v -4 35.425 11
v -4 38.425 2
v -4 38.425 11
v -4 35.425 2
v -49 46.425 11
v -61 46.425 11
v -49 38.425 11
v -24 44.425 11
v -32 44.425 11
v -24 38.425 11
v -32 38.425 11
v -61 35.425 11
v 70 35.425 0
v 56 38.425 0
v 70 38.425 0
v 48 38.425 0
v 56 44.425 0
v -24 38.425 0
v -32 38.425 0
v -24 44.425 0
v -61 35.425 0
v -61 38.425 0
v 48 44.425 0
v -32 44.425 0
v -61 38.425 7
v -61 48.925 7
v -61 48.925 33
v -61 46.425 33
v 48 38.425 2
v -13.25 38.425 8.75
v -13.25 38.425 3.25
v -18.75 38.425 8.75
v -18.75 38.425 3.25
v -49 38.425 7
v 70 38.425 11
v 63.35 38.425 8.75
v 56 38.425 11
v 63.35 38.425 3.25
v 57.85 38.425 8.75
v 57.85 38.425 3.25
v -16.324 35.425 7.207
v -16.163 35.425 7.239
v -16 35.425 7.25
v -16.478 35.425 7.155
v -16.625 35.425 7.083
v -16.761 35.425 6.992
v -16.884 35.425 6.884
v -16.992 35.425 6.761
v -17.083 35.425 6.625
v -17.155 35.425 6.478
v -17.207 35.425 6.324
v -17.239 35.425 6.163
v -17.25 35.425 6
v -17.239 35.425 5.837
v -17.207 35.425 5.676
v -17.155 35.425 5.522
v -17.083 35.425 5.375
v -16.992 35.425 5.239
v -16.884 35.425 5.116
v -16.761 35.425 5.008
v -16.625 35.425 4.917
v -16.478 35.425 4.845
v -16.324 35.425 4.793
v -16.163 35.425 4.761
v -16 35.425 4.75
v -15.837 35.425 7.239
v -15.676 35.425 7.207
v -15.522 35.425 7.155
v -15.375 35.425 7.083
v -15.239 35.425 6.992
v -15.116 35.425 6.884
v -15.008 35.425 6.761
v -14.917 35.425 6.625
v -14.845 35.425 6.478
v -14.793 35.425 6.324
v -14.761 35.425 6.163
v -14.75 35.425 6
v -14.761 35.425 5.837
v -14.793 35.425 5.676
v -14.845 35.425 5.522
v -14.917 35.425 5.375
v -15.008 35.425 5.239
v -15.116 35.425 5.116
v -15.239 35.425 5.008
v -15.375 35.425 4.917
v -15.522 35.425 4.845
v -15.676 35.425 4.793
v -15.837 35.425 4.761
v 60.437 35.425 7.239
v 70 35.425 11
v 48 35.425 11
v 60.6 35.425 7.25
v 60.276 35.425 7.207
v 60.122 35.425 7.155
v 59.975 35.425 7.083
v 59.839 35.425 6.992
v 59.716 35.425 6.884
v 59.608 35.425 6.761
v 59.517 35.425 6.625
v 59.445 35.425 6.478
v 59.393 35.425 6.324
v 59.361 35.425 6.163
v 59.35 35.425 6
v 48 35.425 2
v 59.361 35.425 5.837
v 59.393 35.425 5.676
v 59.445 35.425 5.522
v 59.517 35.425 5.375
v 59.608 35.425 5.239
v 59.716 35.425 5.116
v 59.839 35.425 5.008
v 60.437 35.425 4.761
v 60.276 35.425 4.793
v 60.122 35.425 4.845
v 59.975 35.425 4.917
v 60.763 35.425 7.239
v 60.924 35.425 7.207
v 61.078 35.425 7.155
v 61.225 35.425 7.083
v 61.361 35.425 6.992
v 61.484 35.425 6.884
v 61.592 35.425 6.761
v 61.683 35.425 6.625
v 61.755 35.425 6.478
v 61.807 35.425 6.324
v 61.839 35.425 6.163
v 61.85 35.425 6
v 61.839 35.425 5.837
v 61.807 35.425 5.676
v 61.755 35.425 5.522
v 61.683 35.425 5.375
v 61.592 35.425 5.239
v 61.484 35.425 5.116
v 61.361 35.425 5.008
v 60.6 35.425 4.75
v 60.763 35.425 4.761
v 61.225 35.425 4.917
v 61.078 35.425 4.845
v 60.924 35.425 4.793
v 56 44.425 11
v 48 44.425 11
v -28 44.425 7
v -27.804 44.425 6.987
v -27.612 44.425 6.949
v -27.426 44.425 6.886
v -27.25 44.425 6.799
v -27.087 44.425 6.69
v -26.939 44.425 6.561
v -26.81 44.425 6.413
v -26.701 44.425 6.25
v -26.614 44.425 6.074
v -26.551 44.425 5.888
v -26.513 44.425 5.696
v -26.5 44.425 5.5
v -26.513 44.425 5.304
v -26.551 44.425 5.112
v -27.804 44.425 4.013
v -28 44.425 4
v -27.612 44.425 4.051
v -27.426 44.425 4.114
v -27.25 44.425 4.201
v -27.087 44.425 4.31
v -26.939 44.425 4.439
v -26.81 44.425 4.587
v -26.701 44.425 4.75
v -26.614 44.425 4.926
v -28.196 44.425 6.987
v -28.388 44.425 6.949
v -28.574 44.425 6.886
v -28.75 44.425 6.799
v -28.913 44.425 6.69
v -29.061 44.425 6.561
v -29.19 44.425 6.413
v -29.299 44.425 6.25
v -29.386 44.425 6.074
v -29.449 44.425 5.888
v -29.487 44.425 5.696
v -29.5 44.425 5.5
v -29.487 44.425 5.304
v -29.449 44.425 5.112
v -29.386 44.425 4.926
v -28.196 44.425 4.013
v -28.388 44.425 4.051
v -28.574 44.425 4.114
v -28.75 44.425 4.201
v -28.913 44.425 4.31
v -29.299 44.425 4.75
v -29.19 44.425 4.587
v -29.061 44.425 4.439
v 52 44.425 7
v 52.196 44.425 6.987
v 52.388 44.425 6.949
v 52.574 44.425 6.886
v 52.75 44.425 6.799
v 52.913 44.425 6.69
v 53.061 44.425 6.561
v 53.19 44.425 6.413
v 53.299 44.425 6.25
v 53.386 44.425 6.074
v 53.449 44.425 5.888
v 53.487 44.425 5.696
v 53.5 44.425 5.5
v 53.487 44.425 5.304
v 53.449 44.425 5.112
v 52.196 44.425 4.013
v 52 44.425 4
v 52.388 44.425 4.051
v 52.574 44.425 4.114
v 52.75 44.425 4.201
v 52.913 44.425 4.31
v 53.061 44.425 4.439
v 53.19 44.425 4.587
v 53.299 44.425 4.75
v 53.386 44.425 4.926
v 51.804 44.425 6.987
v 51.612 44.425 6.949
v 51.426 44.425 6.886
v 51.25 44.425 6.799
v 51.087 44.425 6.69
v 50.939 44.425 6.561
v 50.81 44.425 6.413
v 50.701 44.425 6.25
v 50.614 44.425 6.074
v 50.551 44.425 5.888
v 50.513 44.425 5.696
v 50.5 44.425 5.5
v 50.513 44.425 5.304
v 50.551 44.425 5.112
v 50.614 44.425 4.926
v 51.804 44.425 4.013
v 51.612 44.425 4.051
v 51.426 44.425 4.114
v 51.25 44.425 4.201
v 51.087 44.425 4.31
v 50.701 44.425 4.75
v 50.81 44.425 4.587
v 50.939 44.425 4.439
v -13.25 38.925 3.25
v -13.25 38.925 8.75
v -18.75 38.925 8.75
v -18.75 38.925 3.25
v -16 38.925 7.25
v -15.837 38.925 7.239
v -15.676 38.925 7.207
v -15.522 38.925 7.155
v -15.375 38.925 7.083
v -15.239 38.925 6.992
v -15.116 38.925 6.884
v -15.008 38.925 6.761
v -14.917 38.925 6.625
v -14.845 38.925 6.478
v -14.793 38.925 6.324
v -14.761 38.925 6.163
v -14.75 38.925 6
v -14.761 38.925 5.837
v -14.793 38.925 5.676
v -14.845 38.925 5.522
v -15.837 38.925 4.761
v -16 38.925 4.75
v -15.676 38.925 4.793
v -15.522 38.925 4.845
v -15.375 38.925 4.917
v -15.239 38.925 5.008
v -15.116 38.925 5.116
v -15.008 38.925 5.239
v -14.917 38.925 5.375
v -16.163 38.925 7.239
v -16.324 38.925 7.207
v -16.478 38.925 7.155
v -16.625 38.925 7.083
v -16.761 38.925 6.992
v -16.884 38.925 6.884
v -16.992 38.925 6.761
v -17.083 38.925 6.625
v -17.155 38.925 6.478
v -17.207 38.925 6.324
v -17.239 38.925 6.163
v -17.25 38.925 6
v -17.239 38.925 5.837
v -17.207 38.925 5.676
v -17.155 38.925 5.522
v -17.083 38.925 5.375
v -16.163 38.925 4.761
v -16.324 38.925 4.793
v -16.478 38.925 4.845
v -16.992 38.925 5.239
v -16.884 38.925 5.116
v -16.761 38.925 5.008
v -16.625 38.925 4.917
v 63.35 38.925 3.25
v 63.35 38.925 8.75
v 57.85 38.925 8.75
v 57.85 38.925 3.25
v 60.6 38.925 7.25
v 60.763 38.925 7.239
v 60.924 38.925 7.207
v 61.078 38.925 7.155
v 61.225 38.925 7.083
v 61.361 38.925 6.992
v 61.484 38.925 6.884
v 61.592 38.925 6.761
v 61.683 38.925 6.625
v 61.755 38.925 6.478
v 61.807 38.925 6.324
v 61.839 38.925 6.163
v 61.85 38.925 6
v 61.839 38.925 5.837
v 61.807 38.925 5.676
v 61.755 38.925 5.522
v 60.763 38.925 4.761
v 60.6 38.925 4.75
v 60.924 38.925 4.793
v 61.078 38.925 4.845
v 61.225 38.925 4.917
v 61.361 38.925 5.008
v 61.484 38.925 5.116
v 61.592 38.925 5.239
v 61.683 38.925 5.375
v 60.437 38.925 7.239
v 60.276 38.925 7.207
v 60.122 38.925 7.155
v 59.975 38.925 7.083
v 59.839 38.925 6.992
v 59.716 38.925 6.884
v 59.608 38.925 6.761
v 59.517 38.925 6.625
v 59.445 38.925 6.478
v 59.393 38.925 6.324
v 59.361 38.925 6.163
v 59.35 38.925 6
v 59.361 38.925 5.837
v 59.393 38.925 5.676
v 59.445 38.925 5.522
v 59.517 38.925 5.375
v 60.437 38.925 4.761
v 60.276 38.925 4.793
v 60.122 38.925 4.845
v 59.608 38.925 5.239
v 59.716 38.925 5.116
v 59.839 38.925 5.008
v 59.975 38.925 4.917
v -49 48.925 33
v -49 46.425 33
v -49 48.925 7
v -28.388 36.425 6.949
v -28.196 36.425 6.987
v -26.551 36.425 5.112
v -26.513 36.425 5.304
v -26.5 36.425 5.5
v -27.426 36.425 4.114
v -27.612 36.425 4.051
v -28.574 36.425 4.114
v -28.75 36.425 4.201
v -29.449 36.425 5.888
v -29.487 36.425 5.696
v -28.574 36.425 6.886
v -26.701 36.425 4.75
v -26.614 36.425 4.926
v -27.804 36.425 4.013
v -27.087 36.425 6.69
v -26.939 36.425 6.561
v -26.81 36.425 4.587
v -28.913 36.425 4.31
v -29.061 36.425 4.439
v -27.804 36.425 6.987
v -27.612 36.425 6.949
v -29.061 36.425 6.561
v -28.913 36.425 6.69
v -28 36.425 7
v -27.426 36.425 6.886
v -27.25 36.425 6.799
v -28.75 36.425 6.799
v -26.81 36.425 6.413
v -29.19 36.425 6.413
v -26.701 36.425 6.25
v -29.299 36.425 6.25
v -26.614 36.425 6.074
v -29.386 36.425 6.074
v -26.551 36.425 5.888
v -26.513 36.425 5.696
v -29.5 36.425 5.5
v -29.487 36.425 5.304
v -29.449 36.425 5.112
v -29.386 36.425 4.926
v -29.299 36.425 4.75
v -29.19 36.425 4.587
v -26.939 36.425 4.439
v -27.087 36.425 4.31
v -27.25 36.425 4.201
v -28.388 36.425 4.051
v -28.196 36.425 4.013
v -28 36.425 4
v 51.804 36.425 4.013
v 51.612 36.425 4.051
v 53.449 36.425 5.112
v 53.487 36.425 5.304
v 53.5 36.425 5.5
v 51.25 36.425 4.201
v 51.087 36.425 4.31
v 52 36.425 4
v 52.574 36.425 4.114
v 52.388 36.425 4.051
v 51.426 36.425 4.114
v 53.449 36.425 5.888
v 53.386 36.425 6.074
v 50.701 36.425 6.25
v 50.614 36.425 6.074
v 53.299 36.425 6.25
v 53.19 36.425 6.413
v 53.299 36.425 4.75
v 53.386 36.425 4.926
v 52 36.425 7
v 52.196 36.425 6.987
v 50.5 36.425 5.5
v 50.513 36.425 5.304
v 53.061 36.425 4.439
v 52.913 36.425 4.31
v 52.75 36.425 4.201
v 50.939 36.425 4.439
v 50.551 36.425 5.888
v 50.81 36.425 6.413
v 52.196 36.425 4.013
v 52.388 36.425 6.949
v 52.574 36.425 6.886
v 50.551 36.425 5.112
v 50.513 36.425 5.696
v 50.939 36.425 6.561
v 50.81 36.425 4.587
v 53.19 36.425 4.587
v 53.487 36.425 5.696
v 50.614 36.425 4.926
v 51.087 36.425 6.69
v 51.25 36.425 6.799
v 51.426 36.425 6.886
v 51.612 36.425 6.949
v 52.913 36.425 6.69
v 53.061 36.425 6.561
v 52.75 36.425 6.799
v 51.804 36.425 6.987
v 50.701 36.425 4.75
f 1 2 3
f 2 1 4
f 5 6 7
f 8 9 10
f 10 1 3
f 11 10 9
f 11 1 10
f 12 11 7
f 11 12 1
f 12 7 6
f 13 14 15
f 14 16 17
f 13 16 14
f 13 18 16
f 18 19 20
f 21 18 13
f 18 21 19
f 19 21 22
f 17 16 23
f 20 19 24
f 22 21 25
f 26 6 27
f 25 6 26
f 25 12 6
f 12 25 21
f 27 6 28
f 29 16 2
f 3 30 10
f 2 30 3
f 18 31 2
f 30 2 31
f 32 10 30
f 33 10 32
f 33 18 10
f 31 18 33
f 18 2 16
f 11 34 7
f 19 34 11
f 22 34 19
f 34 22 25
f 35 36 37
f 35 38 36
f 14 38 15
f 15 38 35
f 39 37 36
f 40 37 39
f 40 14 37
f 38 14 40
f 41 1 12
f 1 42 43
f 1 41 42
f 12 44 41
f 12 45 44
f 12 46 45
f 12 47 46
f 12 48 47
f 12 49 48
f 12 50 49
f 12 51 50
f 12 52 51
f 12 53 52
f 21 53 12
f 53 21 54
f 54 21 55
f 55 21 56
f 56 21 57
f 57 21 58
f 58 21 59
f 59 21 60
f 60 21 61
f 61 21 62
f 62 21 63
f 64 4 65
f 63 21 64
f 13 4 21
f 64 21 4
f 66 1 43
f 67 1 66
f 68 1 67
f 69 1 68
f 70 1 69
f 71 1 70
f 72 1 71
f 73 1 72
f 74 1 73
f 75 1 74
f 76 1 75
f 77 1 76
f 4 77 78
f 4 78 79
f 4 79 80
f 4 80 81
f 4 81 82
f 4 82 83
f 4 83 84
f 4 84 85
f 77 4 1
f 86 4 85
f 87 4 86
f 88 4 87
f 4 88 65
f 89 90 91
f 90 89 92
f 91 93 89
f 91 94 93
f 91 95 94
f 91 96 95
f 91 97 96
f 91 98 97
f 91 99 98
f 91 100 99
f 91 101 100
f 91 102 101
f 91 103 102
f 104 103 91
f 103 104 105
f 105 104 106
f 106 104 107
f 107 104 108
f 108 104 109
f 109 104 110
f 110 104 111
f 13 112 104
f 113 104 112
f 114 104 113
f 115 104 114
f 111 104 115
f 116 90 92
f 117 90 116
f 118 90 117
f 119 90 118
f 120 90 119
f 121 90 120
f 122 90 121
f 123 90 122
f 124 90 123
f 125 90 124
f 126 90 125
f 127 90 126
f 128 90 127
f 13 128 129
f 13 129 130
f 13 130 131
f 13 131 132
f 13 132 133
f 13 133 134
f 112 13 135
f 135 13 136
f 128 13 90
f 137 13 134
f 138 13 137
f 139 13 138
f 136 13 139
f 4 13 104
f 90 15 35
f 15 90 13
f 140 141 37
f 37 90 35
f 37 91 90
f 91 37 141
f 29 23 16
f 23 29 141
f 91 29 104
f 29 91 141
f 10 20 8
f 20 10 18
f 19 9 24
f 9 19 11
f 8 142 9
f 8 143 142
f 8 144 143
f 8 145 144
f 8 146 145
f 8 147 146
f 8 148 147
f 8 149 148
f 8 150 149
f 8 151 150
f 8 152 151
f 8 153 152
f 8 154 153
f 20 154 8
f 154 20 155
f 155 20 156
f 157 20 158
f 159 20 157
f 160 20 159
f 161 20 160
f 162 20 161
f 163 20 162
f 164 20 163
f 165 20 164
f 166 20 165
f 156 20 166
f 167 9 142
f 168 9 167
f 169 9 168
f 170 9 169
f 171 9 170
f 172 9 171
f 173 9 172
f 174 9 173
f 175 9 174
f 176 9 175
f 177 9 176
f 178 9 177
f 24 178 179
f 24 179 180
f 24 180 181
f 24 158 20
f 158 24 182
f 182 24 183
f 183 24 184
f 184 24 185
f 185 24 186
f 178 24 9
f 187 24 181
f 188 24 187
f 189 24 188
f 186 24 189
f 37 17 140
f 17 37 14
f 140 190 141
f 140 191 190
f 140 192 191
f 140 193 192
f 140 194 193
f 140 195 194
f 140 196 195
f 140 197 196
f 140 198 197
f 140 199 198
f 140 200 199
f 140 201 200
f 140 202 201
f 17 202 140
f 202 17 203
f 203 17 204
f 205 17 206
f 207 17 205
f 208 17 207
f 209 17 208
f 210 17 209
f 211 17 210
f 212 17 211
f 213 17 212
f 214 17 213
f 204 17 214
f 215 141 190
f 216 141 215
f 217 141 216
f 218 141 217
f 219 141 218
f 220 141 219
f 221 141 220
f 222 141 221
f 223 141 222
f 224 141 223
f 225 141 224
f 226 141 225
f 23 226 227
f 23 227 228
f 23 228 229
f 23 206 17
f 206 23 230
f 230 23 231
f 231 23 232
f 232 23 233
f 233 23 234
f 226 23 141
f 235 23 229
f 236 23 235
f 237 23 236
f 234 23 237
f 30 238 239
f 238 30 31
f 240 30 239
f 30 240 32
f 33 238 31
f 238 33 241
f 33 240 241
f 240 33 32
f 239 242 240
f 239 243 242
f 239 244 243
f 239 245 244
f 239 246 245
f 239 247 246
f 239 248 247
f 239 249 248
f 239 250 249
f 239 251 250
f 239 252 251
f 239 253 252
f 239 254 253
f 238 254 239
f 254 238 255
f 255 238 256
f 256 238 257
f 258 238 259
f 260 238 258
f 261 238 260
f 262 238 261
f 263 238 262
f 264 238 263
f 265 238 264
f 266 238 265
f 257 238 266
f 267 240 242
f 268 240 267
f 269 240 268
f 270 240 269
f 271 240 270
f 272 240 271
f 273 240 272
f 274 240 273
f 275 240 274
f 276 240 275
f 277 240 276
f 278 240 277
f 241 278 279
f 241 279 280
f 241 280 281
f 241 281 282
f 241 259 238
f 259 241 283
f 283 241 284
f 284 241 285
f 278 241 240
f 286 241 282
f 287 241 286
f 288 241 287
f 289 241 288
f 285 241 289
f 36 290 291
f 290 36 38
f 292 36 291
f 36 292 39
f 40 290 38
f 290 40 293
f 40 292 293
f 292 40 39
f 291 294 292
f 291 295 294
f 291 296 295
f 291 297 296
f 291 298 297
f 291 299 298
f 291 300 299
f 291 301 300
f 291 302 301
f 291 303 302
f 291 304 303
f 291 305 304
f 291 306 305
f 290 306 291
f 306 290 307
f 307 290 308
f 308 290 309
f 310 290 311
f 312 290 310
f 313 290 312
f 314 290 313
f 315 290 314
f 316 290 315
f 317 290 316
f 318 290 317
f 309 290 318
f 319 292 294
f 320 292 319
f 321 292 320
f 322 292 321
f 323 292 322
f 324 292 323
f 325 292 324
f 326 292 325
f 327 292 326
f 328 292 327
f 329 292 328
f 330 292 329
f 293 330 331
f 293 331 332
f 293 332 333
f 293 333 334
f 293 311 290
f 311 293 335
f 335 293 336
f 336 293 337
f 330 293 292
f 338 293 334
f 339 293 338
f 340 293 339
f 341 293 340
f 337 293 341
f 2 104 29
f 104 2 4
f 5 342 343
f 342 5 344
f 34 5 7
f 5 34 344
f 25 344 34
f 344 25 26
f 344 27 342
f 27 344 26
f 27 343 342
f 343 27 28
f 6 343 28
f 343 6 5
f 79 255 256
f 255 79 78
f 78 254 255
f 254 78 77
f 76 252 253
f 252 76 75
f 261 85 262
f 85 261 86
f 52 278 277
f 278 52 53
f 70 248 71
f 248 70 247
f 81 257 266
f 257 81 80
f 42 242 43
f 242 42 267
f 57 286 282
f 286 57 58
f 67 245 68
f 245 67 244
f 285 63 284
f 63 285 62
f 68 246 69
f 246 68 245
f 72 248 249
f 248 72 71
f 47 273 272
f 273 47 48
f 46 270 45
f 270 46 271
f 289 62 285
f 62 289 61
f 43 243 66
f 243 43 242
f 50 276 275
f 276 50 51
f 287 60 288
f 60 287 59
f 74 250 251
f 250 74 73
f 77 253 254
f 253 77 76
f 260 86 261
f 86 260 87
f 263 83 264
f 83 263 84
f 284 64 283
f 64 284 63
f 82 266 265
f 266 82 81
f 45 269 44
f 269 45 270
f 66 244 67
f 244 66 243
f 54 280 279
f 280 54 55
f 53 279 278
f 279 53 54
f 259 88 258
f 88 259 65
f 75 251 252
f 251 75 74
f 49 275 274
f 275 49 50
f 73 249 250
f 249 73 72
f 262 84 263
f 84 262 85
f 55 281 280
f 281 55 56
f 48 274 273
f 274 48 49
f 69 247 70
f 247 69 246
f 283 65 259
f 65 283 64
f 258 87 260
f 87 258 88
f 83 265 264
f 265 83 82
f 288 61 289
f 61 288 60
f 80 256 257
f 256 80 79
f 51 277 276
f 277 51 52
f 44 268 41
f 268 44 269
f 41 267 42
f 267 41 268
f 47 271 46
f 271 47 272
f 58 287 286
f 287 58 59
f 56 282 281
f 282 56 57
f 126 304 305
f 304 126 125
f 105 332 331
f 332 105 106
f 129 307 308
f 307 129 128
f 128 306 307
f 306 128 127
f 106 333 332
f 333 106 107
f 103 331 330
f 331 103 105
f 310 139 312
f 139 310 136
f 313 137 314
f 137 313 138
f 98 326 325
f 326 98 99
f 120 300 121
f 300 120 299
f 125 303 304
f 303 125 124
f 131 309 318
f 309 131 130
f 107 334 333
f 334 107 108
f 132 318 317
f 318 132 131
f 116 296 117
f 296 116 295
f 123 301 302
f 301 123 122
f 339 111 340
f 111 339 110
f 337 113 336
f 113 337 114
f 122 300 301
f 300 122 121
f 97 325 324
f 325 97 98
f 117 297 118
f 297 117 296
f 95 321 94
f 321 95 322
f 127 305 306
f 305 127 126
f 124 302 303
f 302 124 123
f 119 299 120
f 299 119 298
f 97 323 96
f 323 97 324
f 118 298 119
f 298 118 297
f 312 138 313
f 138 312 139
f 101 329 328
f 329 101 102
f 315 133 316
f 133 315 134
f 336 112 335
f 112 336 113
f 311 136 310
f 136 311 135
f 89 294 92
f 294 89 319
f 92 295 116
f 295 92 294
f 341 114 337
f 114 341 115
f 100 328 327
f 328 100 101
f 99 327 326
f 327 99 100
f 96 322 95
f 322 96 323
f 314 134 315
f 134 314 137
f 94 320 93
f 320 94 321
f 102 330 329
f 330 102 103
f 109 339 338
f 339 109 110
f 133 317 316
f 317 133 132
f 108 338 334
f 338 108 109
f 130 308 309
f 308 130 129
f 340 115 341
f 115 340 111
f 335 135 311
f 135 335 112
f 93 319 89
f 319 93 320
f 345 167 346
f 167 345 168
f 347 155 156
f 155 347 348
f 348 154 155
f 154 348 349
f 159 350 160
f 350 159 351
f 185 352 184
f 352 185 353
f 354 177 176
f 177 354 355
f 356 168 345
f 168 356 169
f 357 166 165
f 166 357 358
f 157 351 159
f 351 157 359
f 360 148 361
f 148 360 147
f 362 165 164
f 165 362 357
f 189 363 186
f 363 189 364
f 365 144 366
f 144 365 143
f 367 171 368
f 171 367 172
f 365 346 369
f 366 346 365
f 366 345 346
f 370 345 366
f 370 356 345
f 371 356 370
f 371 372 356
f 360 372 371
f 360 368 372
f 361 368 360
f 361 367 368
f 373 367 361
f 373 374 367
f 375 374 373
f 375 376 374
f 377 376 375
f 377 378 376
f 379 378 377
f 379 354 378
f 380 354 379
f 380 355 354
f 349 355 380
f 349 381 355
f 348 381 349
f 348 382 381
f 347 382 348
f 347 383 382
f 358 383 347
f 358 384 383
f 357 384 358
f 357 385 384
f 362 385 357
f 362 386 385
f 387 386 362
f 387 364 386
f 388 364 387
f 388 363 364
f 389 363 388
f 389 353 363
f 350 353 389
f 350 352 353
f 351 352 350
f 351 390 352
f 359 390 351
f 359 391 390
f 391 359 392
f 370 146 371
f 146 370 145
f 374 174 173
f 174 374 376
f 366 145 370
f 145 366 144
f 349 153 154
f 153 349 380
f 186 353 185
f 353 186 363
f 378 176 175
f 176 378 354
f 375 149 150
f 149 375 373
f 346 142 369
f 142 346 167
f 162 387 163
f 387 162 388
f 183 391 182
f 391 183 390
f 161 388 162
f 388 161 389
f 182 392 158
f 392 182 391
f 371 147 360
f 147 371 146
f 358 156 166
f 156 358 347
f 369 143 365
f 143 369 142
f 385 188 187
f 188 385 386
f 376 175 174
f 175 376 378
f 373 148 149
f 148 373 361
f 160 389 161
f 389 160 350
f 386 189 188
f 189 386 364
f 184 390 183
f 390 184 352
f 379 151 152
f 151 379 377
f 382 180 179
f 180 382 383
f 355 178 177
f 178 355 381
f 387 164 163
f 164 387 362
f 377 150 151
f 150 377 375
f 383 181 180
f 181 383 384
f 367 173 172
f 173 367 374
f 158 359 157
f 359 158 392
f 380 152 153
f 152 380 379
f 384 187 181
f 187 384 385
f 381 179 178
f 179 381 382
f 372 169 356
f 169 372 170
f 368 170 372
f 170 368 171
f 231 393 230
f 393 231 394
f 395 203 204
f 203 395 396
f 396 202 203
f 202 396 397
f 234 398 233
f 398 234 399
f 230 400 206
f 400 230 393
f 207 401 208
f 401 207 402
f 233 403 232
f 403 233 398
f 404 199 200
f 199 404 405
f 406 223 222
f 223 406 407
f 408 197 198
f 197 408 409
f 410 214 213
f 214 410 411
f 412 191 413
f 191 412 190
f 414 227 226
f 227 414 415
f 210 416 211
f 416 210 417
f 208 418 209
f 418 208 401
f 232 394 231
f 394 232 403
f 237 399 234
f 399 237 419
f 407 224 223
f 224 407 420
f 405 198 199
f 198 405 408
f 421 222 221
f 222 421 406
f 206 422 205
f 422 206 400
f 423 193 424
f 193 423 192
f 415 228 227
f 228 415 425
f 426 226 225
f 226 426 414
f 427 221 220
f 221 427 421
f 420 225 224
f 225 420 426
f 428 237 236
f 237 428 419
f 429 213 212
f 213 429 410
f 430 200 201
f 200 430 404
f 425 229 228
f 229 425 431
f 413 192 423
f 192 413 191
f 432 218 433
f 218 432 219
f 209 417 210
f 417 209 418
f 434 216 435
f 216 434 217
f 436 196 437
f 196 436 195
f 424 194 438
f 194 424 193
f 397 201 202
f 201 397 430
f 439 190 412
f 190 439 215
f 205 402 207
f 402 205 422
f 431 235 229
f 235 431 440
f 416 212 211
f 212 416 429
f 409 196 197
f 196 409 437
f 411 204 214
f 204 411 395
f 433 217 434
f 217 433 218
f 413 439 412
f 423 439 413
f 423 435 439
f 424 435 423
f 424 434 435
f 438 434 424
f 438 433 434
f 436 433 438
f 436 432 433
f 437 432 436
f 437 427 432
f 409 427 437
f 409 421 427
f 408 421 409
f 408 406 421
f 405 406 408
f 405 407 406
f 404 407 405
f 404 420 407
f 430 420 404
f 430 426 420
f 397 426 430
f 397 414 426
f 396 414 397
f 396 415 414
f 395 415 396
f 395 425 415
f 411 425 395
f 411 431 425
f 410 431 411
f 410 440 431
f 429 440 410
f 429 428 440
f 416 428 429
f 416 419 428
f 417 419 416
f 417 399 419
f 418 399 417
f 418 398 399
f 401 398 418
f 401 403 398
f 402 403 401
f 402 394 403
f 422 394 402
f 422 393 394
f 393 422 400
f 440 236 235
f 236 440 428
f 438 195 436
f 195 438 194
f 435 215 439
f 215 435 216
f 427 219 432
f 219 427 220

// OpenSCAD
// file: common.scad
// Small helpers shared by the part files. Include after params.scad.

// An axis-aligned box given by its extents, as task.py's _mm(x0, x1, y0, y1, z0, z1) does.
module box(x0, x1, y0, y1, z0, z1) {
    translate([x0, y0, z0]) cube([x1 - x0, y1 - y0, z1 - z0]);
}

// A round hole or rod along +y from y0 to y1, its axis at (x, z).
module ybore(x, y0, y1, z, d) {
    translate([x, y0, z]) rotate([-90, 0, 0]) cylinder(d = d, h = y1 - y0);
}
// file: params.scad
// Shared dimensions for the printed carrier, sprung rail, guide-rod mounts and SSD dummy (all in mm, grams, N/mm).
//
// Every line is either
//   NAME = value; // task.py: <expression>   a number taken from task.py; check_params.py evaluates <expression>
//                                            against the imported task module (box(BOXES, i) gives a box's
//                                            [x0, x1, y0, y1, z0, z1] in mm) and asserts it equals value
//   NAME = value; // fab: <reason>           a fabrication choice (fit, hardware size); check_params.py checks
//                                            that these are consistent with the task numbers
// Keep one assignment per line and use only numbers, + - * /, names and [ ] lists: check_params.py parses this file.
//
// Frames, as in task.py:
//   carrier: origin on the table under the carrier's centre; x along the carrier, handle bezel toward -x, the drive's
//            connector end (rear) at +x; y across, the sprung rail at +y, the fixed rail at -y; z up.
//   SSD:     origin under the drive's centre on its bottom face; x along it, connector end toward +x; z up.

// ---- the SSD (task.py "the SSD, in its own frame") -----------------------------------------------------------------
SSD_L = 100; // task.py: SSD_L * 1000
SSD_W = 69.85; // task.py: SSD_W * 1000
SSD_H = 7; // task.py: SSD_H * 1000
SSD_MASS_G = 55; // task.py: SSD_MASS * 1000
HALF_W = 34.925; // task.py: HALF_W
HOLE_X = [-36.0, 40.6]; // task.py: HOLE_X
HOLE_Z = 3; // task.py: HOLE_Z
HOLE = 4; // task.py: HOLE
HOLE_DEPTH = 3; // task.py: HOLE_DEPTH
CONN_X = [44, 50]; // task.py: box(SSD_BOXES, 1)[0:2]
CONN_Y = [-31.925, 0]; // task.py: box(SSD_BOXES, 1)[2:4]
LABEL_X = [-42, 30]; // task.py: box(SSD_BOXES, 3)[0:2]
LABEL_Y = [-26, 26]; // task.py: box(SSD_BOXES, 3)[2:4]

// ---- the carrier (task.py "the carrier, in its own frame") ---------------------------------------------------------
CAR_L = 140; // task.py: CAR_L * 1000
CAR_W = 76; // task.py: CAR_W * 1000
CAR_H = 15; // task.py: CAR_H * 1000
CAR_MASS_G = 200; // task.py: CAR_MASS * 1000
SEAT_X = 20; // task.py: SX
SEAT_Z = 4; // task.py: SZ
GAP = 0.5; // task.py: GAP
PIN = 2.5; // task.py: PIN
PIN_IN = 2; // task.py: PIN_IN
RAIL_T = 3; // task.py: RAIL_T
RAIL_IN = 35.425; // task.py: RAIL_IN
RAIL_OUT = 38.425; // task.py: RAIL_OUT
PIN_X = [-16.0, 60.6]; // task.py: PIN_X
PIN_Z = 7; // task.py: PIN_Z
RAIL_SEGS = [[-61, -4], [48, 70]]; // task.py: RAIL_SEGS
RIB_X = [[-25, -10], [50, 65]]; // task.py: RIB_X
RIB_Y_END = 33; // task.py: box(CARRIER_BOXES, 3)[3]
BEZEL_X = [-70, -62]; // task.py: box(CARRIER_BOXES, 0)[0:2]
BEZEL_Y = 38; // task.py: box(CARRIER_BOXES, 0)[3]
HANDLE_X = [-74, -70]; // task.py: box(CARRIER_BOXES, 1)[0:2]
HANDLE_Y = 25; // task.py: box(CARRIER_BOXES, 1)[3]
HANDLE_Z = [3, 12]; // task.py: box(CARRIER_BOXES, 1)[4:6]
FLOOR_X = [-62, -34]; // task.py: box(CARRIER_BOXES, 2)[0:2]
FLOOR_Y = 33; // task.py: box(CARRIER_BOXES, 2)[3]
FLOOR_H = 3; // task.py: box(CARRIER_BOXES, 2)[5]
FIXED_BAR_X = [-70, 70]; // task.py: box(CARRIER_BOXES, 5)[0:2]
FIXED_BAR_H = 3; // task.py: box(CARRIER_BOXES, 5)[5]
FIXED_SEG0_X0 = -62; // task.py: box(CARRIER_BOXES, 6)[0]
RAIL_H = 12; // task.py: box(CARRIER_BOXES, 6)[5]

// ---- the sprung rail (task.py _latch_rail) -------------------------------------------------------------------------
RAIL_Z0 = 1; // task.py: box(rail.boxes, 0)[4]
RAIL_BAR_X = [-61, 70]; // task.py: box(rail.boxes, 2)[0:2]
RAIL_BAR_H = 3; // task.py: box(rail.boxes, 2)[5]
RAIL_TRAVEL = 7; // task.py: RAIL_TRAVEL * 1000
RAIL_RATE = 0.15; // task.py: RAIL_RATE / 1000
RAIL_MASS_G = 30; // task.py: rail.mass * 1000
TAB_X = [-61, -49]; // task.py: TAB_X
TAB_Y = [46.425, 48.925]; // task.py: TAB_Y
TAB_Z = [8, 34]; // task.py: TAB_Z
BRACKET_Z = [8, 12]; // task.py: box(rail.boxes, 3)[4:6]

// ---- print fits (fabrication choices) ------------------------------------------------------------------------------
SLIDE_CLR = 0.3; // fab: diametral clearance of a sliding fit (rod in its mount bore), and the rail's floor clearance
PRESS_CLR = 0; // fab: printed at nominal size for a press fit; horizontal printed holes come out slightly small
POCKET_CLR = 0.3; // fab: clearance round ballast plates and bars in their pockets
$fn = 48; // fab: facets on round holes

// ---- hardware (fabrication choices) --------------------------------------------------------------------------------
PIN_D = 2.5; // fab: 2.5 mm steel dowel pin, as wide as the task's 2.5 mm square pins (0.75 mm clear in a 4 mm hole)
PIN_L = 6; // fab: dowel pin length; PIN_IN + GAP stands proud of the rail, the rest is pressed in
PIN_BOSS = PIN_L - PIN_IN - GAP - RAIL_T; // fab: 0.5 mm pad on the rail's outer face so the pin sits flush there
ROD_D = 3; // fab: 3 mm ground steel rod (silver steel / drill rod / 3 mm linear shaft)
ROD_X = [-28, 52]; // fab: the two guide rods, one in each rail segment, clear of the pins and the pull tab
ROD_Z = 6.5; // fab: rod axis height, mid-height of the rail
BOSS_W = 8; // fab: width (along x) of the rod boss on the sprung rail's outer face
BOSS_L = 6; // fab: how far the rod boss stands out from the rail's outer face
ROD_EMBED = 8; // fab: depth of the blind press-fit bore for the rod in the rail and its boss
MOUNT_W = 12; // fab: guide-rod mount width along x
MOUNT_T = 10; // fab: guide-rod mount length along the rod (the sliding bore's length)
MOUNT_H = 12; // fab: guide-rod mount height
MOUNT_Y0 = RAIL_OUT + BOSS_L + RAIL_TRAVEL; // fab: the boss meets the mount's inner face at full travel (hard stop)
MOUNT_Y1 = MOUNT_Y0 + MOUNT_T; // fab: the mount's outer face
ROD_PROUD = 1; // fab: the rod stands 1 mm out of the mount's outer face with the rail closed
ROD_L = ROD_EMBED + RAIL_TRAVEL + MOUNT_T + ROD_PROUD; // fab: cut length of each guide rod (26 mm)
TONGUE_W = 20; // fab: width of the base web that carries each mount
N_SPRINGS = 2; // fab: one compression spring over each guide rod
SPRING_WIRE = 0.3; // fab: music (spring steel) wire diameter
SPRING_OD = 5; // fab: spring outside diameter (inside 4.4 mm, clear of the 3 mm rod)
SPRING_ACTIVE = 10; // fab: active coils; closed and ground ends add one dead coil at each end
SPRING_POCKET = 6; // fab: depth of the spring pocket in the mount; the spring's length at full travel
SPRING_PRELOAD = 0.5; // fab: compression already in each spring with the rail closed
SPRING_FREE = SPRING_POCKET + RAIL_TRAVEL + SPRING_PRELOAD; // fab: free length (13.5 mm)
SPRING_RATE = RAIL_RATE / N_SPRINGS; // fab: rate of each spring, 0.075 N/mm, so the pair matches the task's 150 N/m
SPRING_POCKET_D = SPRING_OD + 1; // fab: spring pocket diameter

// ---- the real fixture's floor and ballast (fabrication choices) ----------------------------------------------------
BASE_T = RAIL_Z0 - SLIDE_CLR; // fab: 0.7 mm base web under the whole carrier and the sprung rail, below the rail
STOP_H = 3; // fab: rib extensions up to y = RAIL_IN are the sprung rail's closed stop; they stay below the drive (4)
SLAB_X = [-10, 50]; // fab: ballast slab between the ribs, under the drive
SLAB_Y = 30; // fab: slab half-width (the fingers' room beside the drive is left open)
SLAB_H = 3.5; // fab: slab top, 0.5 mm below the seated drive's bottom face
SLAB_POCKET = [55, 55, 3]; // fab: steel ballast plate, 55 x 55 x 3 mm, set in from the top
BEZEL_POCKET = [6, 70, 12]; // fab: steel flat bar 6 x 12 mm, 70 mm long, set in the bezel from below
FLOOR_POCKET = [24, 60, 2]; // fab: steel plate 24 x 60 x 2 mm, set in the front floor plate from below
// main file
// Sprung rail: the separate side rail that slides outward (+y) up to RAIL_TRAVEL against the springs. It carries two
// dowel pins (pressed through it, standing PIN_IN + GAP in from its inner face), the pull tab on its bracket, and two
// rod bosses on its outer face, each with a blind press-fit bore for a guide rod.
//
// sprung_rail() draws it in the carrier frame, closed (its inner face at y = RAIL_IN), as assembly.scad uses it.
// The part as rendered by this file is moved down to the bed: print it upright, as it stands in the carrier, with
// supports under the tab's bracket only (BRACKET_Z[0] - RAIL_Z0 mm up). Print in blue, or paint the tab blue.

include <params.scad>
include <common.scad>

module sprung_rail() {
    difference() {
        union() {
            // the two rail segments around the pins, and the low bar joining them
            for (s = RAIL_SEGS) box(s[0], s[1], RAIL_IN, RAIL_OUT, RAIL_Z0, RAIL_H);
            box(RAIL_BAR_X[0], RAIL_BAR_X[1], RAIL_IN, RAIL_OUT, RAIL_Z0, RAIL_BAR_H);
            // the pull tab's bracket, and the tab
            box(TAB_X[0], TAB_X[1], RAIL_OUT - 1, TAB_Y[1], BRACKET_Z[0], BRACKET_Z[1]);
            box(TAB_X[0], TAB_X[1], TAB_Y[0], TAB_Y[1], TAB_Z[0], TAB_Z[1]);
            // rod bosses on the outer face
            for (x = ROD_X) box(x - BOSS_W / 2, x + BOSS_W / 2, RAIL_OUT - 1, RAIL_OUT + BOSS_L, RAIL_Z0, RAIL_H);
            // pads round the pin bores on the outer face
            for (x = PIN_X)
                box(x - PIN_D / 2 - 1.5, x + PIN_D / 2 + 1.5, RAIL_OUT - 1, RAIL_OUT + PIN_BOSS,
                    PIN_Z - PIN_D / 2 - 1.5, PIN_Z + PIN_D / 2 + 1.5);
        }
        // press-fit bores for the two dowel pins, right through
        for (x = PIN_X) ybore(x, RAIL_IN - 1, RAIL_OUT + PIN_BOSS + 1, PIN_Z, PIN_D + PRESS_CLR);
        // blind press-fit bores for the guide rods, from the boss's outer face
        for (x = ROD_X) ybore(x, RAIL_OUT + BOSS_L - ROD_EMBED, RAIL_OUT + BOSS_L + 1, ROD_Z, ROD_D + PRESS_CLR);
    }
}

translate([0, 0, -RAIL_Z0]) sprung_rail();
